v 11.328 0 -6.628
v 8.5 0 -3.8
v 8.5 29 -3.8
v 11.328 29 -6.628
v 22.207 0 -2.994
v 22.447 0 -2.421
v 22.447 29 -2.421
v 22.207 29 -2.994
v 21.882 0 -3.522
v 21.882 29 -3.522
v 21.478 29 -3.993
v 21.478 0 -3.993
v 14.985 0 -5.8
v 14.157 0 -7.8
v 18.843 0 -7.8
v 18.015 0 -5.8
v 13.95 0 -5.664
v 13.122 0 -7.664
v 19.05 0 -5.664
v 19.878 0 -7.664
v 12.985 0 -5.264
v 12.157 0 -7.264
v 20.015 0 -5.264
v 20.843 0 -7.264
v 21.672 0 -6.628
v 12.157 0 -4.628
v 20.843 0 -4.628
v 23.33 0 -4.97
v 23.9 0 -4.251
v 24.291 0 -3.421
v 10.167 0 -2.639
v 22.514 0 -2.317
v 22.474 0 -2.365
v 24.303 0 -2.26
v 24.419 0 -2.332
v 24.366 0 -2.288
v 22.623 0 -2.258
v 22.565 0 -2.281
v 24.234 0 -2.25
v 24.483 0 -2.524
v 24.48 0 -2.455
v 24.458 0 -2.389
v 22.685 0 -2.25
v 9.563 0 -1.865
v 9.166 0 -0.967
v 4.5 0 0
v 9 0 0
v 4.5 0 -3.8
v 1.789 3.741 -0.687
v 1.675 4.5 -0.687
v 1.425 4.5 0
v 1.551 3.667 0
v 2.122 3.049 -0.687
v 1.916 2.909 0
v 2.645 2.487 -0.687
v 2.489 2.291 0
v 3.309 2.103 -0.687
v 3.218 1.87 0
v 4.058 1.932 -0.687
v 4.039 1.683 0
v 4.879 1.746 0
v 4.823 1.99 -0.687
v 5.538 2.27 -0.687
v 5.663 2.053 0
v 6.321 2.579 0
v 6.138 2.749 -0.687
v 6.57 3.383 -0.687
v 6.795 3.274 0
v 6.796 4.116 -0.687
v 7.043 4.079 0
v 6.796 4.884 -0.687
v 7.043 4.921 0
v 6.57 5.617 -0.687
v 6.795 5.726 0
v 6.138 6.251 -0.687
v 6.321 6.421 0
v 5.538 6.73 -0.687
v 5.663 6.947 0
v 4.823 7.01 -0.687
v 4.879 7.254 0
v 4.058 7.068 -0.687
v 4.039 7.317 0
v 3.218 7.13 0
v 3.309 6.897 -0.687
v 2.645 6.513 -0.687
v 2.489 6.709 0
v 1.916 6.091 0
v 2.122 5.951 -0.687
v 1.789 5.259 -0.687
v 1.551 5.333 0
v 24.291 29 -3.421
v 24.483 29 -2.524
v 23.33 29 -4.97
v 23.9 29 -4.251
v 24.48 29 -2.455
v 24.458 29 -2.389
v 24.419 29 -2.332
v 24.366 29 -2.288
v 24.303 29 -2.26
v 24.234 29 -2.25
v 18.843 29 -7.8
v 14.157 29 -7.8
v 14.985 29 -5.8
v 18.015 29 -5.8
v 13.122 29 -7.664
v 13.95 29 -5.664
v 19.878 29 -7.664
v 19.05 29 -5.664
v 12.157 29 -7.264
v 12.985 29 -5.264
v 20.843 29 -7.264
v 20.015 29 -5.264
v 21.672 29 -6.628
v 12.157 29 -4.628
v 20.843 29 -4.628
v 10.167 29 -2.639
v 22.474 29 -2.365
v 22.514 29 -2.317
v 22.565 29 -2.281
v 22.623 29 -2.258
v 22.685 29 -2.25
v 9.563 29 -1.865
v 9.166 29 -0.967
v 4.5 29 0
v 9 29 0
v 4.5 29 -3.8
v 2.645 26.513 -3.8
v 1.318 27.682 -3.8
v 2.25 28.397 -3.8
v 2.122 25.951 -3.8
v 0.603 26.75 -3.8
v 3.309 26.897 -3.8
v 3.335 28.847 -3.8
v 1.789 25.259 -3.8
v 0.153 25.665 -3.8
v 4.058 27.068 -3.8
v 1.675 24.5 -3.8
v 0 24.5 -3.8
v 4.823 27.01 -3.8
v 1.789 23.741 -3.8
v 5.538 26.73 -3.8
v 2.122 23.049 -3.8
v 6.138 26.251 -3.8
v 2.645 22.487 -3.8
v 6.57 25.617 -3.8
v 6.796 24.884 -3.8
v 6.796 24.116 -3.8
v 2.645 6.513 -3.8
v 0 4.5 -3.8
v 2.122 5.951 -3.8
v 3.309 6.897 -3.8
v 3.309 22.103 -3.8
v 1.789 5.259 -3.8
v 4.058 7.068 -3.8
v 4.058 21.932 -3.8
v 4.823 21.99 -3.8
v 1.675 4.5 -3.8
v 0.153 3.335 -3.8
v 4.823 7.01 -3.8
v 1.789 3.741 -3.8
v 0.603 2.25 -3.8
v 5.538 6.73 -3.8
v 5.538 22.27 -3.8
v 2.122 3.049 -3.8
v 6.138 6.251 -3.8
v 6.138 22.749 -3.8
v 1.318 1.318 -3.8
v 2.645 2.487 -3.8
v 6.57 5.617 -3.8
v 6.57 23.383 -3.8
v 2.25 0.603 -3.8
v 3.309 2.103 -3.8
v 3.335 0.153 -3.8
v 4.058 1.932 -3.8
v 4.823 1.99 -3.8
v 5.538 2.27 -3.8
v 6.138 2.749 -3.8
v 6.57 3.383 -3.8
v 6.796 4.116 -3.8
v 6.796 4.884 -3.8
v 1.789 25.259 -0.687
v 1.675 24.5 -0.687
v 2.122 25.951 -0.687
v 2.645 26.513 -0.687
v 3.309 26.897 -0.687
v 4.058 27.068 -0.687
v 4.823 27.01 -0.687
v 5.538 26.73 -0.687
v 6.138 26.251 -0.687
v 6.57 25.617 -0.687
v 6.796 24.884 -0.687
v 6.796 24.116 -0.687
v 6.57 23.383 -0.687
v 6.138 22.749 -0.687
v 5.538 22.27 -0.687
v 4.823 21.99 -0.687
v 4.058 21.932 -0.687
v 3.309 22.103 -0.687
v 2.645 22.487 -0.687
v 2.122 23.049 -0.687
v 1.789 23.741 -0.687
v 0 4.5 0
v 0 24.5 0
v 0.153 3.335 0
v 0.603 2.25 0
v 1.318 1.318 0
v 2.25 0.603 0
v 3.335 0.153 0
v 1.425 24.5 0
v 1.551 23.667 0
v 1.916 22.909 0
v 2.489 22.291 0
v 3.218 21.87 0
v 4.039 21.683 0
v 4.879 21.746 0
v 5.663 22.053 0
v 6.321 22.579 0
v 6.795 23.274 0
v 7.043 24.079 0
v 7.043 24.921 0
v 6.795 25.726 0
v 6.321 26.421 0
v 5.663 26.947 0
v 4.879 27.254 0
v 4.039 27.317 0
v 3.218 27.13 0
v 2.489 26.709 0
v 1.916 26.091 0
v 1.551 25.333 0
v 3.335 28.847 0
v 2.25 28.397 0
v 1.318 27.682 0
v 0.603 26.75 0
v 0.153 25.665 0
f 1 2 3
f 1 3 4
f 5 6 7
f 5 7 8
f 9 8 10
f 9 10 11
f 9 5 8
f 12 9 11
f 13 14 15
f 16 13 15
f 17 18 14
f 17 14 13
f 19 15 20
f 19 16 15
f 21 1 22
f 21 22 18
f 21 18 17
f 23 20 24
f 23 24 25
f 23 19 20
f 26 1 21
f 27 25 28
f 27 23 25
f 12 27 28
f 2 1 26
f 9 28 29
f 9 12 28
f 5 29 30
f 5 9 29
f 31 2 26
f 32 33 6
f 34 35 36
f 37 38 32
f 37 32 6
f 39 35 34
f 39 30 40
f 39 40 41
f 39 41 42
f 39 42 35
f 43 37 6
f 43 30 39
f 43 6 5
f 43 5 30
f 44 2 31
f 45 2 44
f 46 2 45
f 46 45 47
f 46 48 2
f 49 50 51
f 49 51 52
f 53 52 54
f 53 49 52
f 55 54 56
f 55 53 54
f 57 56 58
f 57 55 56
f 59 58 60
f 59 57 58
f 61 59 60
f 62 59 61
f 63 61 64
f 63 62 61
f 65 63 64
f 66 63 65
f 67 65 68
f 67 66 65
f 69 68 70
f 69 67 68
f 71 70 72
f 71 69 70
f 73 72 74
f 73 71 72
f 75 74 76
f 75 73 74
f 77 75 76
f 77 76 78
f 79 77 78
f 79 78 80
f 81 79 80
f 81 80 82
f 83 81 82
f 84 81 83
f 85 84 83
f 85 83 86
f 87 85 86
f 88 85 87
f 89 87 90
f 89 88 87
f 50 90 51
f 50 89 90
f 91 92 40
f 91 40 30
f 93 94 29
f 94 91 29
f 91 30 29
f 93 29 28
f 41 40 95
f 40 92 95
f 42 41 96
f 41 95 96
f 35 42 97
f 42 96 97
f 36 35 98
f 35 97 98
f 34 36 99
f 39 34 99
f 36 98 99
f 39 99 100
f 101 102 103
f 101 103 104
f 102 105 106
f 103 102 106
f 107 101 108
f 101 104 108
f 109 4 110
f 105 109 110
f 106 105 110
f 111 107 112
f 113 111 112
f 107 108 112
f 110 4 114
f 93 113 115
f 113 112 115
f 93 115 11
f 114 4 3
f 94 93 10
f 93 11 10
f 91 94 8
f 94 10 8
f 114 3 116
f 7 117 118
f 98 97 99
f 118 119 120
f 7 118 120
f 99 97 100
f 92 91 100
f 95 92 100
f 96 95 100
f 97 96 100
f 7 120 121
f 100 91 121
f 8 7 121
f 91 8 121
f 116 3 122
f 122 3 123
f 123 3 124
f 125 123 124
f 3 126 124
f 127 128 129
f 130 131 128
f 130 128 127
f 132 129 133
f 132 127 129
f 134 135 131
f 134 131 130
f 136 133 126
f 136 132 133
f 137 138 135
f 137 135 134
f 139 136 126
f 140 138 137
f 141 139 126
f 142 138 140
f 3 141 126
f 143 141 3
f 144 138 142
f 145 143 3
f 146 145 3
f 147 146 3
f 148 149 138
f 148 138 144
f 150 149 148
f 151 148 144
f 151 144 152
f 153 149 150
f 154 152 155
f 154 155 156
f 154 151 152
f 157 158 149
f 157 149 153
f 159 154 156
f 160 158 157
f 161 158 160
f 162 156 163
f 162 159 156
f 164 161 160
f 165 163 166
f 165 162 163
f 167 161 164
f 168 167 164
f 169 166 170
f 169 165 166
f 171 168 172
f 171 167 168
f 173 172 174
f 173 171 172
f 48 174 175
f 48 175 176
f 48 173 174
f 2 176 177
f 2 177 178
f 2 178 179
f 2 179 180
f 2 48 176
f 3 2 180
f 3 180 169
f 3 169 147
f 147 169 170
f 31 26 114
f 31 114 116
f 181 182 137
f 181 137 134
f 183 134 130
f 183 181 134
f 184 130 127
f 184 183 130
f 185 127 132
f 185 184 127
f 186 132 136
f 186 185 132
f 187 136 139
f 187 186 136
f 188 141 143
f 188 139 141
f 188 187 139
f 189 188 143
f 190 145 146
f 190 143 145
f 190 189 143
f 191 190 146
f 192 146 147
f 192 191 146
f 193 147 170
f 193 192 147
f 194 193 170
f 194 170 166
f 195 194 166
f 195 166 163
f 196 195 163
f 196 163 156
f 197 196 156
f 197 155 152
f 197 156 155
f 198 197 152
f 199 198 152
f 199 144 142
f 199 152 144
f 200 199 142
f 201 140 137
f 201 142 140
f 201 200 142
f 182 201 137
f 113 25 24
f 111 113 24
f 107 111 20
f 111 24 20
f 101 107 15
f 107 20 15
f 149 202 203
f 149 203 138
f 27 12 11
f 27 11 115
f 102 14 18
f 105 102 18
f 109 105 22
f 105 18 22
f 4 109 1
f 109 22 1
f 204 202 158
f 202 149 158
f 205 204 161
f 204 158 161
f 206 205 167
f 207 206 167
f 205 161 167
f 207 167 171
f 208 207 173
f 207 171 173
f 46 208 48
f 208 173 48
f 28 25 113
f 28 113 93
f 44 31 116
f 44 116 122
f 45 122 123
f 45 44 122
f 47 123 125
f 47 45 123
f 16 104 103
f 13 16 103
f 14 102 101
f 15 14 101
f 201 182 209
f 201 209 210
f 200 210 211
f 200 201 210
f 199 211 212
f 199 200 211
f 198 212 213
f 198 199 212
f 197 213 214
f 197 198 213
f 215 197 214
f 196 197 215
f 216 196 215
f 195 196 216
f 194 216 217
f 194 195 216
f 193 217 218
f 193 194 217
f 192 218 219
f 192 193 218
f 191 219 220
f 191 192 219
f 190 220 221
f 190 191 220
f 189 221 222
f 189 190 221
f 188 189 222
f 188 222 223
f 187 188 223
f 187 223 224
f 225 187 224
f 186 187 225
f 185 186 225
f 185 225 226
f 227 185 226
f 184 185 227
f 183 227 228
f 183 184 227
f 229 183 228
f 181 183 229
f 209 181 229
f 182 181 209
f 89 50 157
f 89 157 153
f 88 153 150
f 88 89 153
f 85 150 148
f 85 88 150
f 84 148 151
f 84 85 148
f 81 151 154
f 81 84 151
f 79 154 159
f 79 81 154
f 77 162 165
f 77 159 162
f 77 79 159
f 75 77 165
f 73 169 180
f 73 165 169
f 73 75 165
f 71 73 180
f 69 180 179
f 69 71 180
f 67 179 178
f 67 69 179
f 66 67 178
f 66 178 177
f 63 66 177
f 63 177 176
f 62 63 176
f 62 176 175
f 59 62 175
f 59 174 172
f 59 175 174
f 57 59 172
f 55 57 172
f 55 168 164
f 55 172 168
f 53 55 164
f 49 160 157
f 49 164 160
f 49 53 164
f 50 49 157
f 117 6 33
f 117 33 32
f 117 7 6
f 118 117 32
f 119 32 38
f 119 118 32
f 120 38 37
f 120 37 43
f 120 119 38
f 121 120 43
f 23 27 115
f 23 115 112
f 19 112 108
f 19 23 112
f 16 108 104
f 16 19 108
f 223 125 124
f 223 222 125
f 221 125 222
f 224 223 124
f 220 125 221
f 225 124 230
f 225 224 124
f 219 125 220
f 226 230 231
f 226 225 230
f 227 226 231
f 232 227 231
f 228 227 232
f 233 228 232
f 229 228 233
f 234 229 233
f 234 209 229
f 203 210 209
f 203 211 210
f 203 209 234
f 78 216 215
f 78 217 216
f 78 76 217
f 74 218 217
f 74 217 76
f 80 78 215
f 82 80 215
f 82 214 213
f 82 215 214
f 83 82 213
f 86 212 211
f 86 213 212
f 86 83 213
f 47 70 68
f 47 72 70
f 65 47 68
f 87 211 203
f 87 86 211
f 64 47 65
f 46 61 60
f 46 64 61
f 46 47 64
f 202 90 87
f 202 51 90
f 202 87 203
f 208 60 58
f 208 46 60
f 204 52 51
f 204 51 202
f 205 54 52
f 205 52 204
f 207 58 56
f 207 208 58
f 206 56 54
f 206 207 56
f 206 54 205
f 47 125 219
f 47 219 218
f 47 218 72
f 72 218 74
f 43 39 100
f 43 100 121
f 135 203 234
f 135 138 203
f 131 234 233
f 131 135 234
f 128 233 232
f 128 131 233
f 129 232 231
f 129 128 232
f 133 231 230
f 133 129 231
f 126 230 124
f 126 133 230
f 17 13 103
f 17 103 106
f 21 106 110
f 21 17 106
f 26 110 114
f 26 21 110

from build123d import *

# Parameters (mm, degrees)
BOSS_EXTRUDE1_DEPTH     = 29
CUT_EXTRUDE1_DEPTH      = 39.173943993
CUT_EXTRUDE1_DEPTH_BACK = 39.173943993
SKETCH2_R               = 2.575
FILLET1_R               = 4.5
FILLET2_R               = 4
CHAMFER1_SIZE           = 0.25
CHAMFER1_SIZE2          = 0.686869355
FILLET4_R               = 0.25


with BuildPart() as part:
    # Sketch1 → Boss-Extrude1 (new body)
    with BuildSketch(Plane(origin=(0, 0, 0), x_dir=(1, 0, 0), z_dir=(0, 1, 0))):
        Polygon((0, 0), (0, 3.8), (8.5, 3.8), (12.5, 7.8), (20.5, 7.8), (24.5, 3.8), (24.5, 2.25), (22.5, 2.25), (22.5, 2.971572875), (19.671572875, 5.8), (13.328427125, 5.8), (9, 1.471572875), (9, 0), align=None)
    extrude(amount=BOSS_EXTRUDE1_DEPTH)

    # Sketch2 → Cut-Extrude1 (cut, two sides: drawn at the far end of the back side and taken through both)
    with BuildSketch(Plane(origin=(0, 0, -3.8), x_dir=(-1, 0, 0), z_dir=(0, 0, -1)).offset(-CUT_EXTRUDE1_DEPTH_BACK)):
        with Locations((-4.25, 4.5)):
            Circle(SKETCH2_R)
        with Locations((-4.25, 24.5)):
            Circle(SKETCH2_R)
    extrude(amount=CUT_EXTRUDE1_DEPTH + CUT_EXTRUDE1_DEPTH_BACK, mode=Mode.SUBTRACT)

    # Fillet1
    fillet1_edges = [part.edges().sort_by_distance(p)[0] for p in [
        (0, 0, -1.9),
        (0, 29, -1.9),
    ]]
    fillet(fillet1_edges, radius=FILLET1_R)

    # Fillet2
    # the kernel refuses this fillet: 4 mm, written as the material it adds along each edge
    with BuildSketch(Plane(origin=(9, 0, -1.471572875), x_dir=(0, 0, 1), z_dir=(0, 1, 0))) as fillet2_piece_1:
        with BuildLine():
            CenterArc((1.66135914, 3.99549511), FILLET2_R, 225, 42.280491011)
            Line((-1.167067985, 1.167067985), (-1.223636528, 1.110499443))
            Line((-1.223636528, 1.110499443), (-0.056568542, -0.056568542))
            Line((-0.056568542, -0.056568542), (0, -0.08))
            ThreePointArc((0, -0.08), (0.735786438, -0.08), (1.46777715, -0.079909902))
            Line((1.46777715, -0.079909902), (1.471572875, 0))
        make_face()
    extrude(amount=29)
    with BuildSketch(Plane(origin=(19.671572875, 0, -5.8), x_dir=(-1, 0, 0), z_dir=(0, 1, 0)), Plane(origin=(13.328427125, 0, -5.8), x_dir=(-0.7071067811865457, 0, 0.7071067811865493), z_dir=(0, 1, 0))) as fillet2_piece_2:
        with BuildLine():
            CenterArc((FILLET2_R * 0.414213562373, FILLET2_R), FILLET2_R, 225, 45)
            Line((-FILLET2_R * 0.292893218813, FILLET2_R * 0.292893218813), (-FILLET2_R * 0.307035354437, FILLET2_R * 0.27875108319))
            Line((-FILLET2_R * 0.307035354437, FILLET2_R * 0.27875108319), (-FILLET2_R * 0.00828427124746, -FILLET2_R * 0.02))
            Line((-FILLET2_R * 0.00828427124746, -FILLET2_R * 0.02), (FILLET2_R * 0.414213562373, -FILLET2_R * 0.02))
            Line((FILLET2_R * 0.414213562373, -FILLET2_R * 0.02), (FILLET2_R * 0.414213562373, 0))
        make_face()
    extrude(amount=29)
    with BuildSketch(Plane(origin=(22.5, 0, -2.971572875), x_dir=(-0.7071067811865455, 0, -0.7071067811865495), z_dir=(0, 1, 0))) as fillet2_piece_3:
        with BuildLine():
            CenterArc((1.444636364, 4), FILLET2_R, 240.743753532, 29.256246468)
            Line((-0.510229073, 0.510229073), (-0.549326382, 0.440433655))
            ThreePointArc((-0.549326382, 0.440433655), (-0.311683079, 0.198545994), (-0.056568542, -0.056568542))
            Line((-0.056568542, -0.056568542), (0, -0.08))
            Line((0, -0.08), (1.444636364, -0.08))
            Line((1.444636364, -0.08), (1.444636364, 0))
        make_face()
    extrude(amount=29)
    # the kernel refuses this fillet: 4 mm, written as the material it takes off along each edge
    with BuildSketch(Plane(origin=(20.5, -4.142135624, -7.8), x_dir=(0.7071067811865446, 0, 0.7071067811865505), z_dir=(0, 1, 0))) as fillet2_2_piece_1:
        with BuildLine():
            CenterArc((FILLET2_R * 0.414213562373, -FILLET2_R), FILLET2_R, 90, 45)
            Line((-FILLET2_R * 0.292893218813, -FILLET2_R * 0.292893218813), (-FILLET2_R * 0.307035354437, -FILLET2_R * 0.27875108319))
            Line((-FILLET2_R * 0.307035354437, -FILLET2_R * 0.27875108319), (-FILLET2_R * 0.00828427124746, FILLET2_R * 0.02))
            Line((-FILLET2_R * 0.00828427124746, FILLET2_R * 0.02), (FILLET2_R * 0.414213562373, FILLET2_R * 0.02))
            Line((FILLET2_R * 0.414213562373, FILLET2_R * 0.02), (FILLET2_R * 0.414213562373, 0))
        make_face()
    extrude(amount=37.284271247, mode=Mode.SUBTRACT)
    with BuildSketch(Plane(origin=(12.5, -4.142135624, -7.8), x_dir=(-0.7071067811865461, 0, 0.7071067811865489), z_dir=(0, 1, 0))) as fillet2_2_piece_2:
        with BuildLine():
            CenterArc((FILLET2_R * 0.414213562373, FILLET2_R), FILLET2_R, 225, 45)
            Line((-FILLET2_R * 0.292893218813, FILLET2_R * 0.292893218813), (-FILLET2_R * 0.307035354437, FILLET2_R * 0.27875108319))
            Line((-FILLET2_R * 0.307035354437, FILLET2_R * 0.27875108319), (-FILLET2_R * 0.00828427124746, -FILLET2_R * 0.02))
            Line((-FILLET2_R * 0.00828427124746, -FILLET2_R * 0.02), (FILLET2_R * 0.414213562373, -FILLET2_R * 0.02))
            Line((FILLET2_R * 0.414213562373, -FILLET2_R * 0.02), (FILLET2_R * 0.414213562373, 0))
        make_face()
    extrude(amount=37.284271247, mode=Mode.SUBTRACT)
    with BuildSketch(Plane(origin=(24.5, -4.136949157, -3.8), x_dir=(0, 0, 1), z_dir=(0, 1, 0))) as fillet2_2_piece_3:
        with BuildLine():
            CenterArc((1.658321204, -3.998533046), FILLET2_R, 91.551776657, 43.448223343)
            Line((-1.170105921, -1.170105921), (-1.226674463, -1.113537378))
            Line((-1.226674463, -1.113537378), (-0.056568542, 0.056568542))
            Line((-0.056568542, 0.056568542), (0, 0.08))
            ThreePointArc((0, 0.08), (0.775, 0.08), (1.547833576, 0.079970661))
            Line((1.547833576, 0.079970661), (1.55, 0))
        make_face()
    extrude(amount=37.273898313, mode=Mode.SUBTRACT)

    # Chamfer1
    chamfer1_edges = [part.edges().sort_by_distance(p)[0] for p in [
        (6.825, 4.5, 0),
        (6.825, 24.5, 0),
    ]]
    chamfer1_side = [part.faces().sort_by_distance(p)[0] for p in [
        (4.693643045, 14.5, 0),
    ]]
    chamfer(chamfer1_edges, length=CHAMFER1_SIZE, length2=CHAMFER1_SIZE2, reference=chamfer1_side[0])

    # Fillet4
    fillet4_edges = [part.edges().sort_by_distance(p)[0] for p in [
        (24.5, 14.5, -2.25),
        (22.5, 14.5, -2.25),
    ]]
    fillet(fillet4_edges, radius=FILLET4_R)


solid = part.part
